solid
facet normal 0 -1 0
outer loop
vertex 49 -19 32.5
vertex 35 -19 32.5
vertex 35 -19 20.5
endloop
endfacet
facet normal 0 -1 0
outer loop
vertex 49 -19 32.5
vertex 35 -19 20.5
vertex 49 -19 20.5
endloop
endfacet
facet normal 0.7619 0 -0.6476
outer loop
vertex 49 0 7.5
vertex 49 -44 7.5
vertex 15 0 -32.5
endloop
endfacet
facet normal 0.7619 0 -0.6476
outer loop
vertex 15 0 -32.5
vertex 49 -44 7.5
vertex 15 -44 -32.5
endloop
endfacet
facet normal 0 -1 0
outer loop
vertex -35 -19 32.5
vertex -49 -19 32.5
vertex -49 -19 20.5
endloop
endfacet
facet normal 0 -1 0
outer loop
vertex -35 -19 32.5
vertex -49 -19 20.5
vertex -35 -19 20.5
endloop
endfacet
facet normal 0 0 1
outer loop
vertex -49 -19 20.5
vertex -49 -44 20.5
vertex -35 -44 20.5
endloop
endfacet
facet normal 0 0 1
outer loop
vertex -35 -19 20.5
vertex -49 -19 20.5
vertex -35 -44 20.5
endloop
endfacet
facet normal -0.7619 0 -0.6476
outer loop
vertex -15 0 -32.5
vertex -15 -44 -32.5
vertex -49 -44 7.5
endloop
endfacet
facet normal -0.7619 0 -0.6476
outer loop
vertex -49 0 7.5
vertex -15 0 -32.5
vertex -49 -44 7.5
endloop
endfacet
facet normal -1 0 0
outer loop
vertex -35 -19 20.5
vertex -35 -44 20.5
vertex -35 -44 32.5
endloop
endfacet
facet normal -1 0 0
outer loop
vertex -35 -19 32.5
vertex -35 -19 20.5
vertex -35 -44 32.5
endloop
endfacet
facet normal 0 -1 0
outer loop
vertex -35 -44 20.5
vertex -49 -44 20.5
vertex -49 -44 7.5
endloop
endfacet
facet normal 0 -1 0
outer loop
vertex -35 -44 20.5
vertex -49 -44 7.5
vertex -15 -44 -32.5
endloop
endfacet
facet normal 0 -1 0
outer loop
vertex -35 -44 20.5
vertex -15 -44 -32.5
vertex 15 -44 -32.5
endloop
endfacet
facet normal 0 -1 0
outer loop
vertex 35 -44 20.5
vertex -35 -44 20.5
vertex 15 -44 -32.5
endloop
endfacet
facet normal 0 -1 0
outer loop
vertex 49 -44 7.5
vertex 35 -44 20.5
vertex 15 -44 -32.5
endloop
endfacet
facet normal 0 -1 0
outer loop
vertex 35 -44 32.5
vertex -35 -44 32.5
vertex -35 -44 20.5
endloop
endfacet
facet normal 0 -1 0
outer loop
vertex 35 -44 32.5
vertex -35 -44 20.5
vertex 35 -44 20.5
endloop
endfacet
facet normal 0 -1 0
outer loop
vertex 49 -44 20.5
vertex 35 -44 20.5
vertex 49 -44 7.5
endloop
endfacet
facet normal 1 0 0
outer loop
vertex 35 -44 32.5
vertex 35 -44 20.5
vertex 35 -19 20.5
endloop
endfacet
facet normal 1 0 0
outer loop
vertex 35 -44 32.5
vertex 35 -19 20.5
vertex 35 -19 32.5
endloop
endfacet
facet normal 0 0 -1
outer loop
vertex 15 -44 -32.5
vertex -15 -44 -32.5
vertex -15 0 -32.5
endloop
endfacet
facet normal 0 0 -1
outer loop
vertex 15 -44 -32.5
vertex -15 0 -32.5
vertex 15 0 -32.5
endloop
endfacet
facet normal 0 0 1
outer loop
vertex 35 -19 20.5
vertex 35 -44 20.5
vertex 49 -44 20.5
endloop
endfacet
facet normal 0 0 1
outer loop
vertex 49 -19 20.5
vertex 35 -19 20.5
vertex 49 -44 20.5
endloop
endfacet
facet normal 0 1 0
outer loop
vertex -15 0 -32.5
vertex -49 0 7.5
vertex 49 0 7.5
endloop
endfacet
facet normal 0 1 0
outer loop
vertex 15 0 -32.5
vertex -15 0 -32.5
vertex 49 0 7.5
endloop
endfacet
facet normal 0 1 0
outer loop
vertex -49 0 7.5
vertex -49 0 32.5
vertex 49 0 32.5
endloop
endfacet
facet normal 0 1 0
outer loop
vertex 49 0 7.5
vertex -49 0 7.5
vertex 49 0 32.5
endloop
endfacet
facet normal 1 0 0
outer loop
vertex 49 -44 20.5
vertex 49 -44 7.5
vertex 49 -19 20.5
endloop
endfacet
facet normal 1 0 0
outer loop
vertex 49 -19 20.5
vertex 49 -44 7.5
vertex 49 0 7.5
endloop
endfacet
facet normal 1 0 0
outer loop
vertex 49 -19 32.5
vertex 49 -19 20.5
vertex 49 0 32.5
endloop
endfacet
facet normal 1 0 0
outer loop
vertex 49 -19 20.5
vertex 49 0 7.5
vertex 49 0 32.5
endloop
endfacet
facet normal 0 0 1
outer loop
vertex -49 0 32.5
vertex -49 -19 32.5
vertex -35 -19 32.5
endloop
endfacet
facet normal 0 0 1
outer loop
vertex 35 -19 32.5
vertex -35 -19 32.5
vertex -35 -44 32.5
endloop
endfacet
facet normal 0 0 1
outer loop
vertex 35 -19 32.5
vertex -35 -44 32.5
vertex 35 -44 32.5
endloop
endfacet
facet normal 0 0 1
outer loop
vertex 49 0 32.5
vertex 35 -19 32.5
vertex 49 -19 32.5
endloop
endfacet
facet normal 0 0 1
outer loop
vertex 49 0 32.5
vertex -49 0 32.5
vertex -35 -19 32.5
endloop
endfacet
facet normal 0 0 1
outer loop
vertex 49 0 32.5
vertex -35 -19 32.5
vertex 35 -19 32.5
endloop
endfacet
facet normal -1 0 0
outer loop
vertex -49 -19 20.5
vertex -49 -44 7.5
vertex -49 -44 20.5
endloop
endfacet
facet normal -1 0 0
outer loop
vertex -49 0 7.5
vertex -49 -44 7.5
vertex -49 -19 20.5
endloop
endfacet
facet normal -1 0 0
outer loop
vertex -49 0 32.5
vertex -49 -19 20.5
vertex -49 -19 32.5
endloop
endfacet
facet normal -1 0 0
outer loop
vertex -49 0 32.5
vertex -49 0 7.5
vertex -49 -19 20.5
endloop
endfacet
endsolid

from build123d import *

# Parameters (mm, degrees)
F0_W     = 98
F0_H     = 65
F1_DEPTH = 44
F2_W     = 14
F2_H     = 12
F3_DEPTH = 25
F5_DEPTH = 44.001


with BuildPart() as f1:
    # F0 (on Front) → F1 (new body)
    with BuildSketch(Plane.XZ):
        Rectangle(F0_W, F0_H)
    extrude(amount=F1_DEPTH)

    # F2 (on face) → F3 (cut)
    with BuildSketch(Plane.XZ.offset(44)):
        with Locations((-42, 26.5)):
            Rectangle(F2_W, F2_H)
        with Locations((42, 26.5)):
            Rectangle(F2_W, F2_H)
    extrude(amount=-F3_DEPTH, mode=Mode.SUBTRACT)

    # F4 (on face) → F5 (cut, through all)
    with BuildSketch(Plane.XZ.offset(44)):
        Polygon((49, 7.5), (15, -32.5), (49, -32.5), align=None)
        Polygon((-15, -32.5), (-49, 7.5), (-49, -32.5), align=None)
    extrude(amount=-F5_DEPTH, mode=Mode.SUBTRACT)


solid = f1.part
